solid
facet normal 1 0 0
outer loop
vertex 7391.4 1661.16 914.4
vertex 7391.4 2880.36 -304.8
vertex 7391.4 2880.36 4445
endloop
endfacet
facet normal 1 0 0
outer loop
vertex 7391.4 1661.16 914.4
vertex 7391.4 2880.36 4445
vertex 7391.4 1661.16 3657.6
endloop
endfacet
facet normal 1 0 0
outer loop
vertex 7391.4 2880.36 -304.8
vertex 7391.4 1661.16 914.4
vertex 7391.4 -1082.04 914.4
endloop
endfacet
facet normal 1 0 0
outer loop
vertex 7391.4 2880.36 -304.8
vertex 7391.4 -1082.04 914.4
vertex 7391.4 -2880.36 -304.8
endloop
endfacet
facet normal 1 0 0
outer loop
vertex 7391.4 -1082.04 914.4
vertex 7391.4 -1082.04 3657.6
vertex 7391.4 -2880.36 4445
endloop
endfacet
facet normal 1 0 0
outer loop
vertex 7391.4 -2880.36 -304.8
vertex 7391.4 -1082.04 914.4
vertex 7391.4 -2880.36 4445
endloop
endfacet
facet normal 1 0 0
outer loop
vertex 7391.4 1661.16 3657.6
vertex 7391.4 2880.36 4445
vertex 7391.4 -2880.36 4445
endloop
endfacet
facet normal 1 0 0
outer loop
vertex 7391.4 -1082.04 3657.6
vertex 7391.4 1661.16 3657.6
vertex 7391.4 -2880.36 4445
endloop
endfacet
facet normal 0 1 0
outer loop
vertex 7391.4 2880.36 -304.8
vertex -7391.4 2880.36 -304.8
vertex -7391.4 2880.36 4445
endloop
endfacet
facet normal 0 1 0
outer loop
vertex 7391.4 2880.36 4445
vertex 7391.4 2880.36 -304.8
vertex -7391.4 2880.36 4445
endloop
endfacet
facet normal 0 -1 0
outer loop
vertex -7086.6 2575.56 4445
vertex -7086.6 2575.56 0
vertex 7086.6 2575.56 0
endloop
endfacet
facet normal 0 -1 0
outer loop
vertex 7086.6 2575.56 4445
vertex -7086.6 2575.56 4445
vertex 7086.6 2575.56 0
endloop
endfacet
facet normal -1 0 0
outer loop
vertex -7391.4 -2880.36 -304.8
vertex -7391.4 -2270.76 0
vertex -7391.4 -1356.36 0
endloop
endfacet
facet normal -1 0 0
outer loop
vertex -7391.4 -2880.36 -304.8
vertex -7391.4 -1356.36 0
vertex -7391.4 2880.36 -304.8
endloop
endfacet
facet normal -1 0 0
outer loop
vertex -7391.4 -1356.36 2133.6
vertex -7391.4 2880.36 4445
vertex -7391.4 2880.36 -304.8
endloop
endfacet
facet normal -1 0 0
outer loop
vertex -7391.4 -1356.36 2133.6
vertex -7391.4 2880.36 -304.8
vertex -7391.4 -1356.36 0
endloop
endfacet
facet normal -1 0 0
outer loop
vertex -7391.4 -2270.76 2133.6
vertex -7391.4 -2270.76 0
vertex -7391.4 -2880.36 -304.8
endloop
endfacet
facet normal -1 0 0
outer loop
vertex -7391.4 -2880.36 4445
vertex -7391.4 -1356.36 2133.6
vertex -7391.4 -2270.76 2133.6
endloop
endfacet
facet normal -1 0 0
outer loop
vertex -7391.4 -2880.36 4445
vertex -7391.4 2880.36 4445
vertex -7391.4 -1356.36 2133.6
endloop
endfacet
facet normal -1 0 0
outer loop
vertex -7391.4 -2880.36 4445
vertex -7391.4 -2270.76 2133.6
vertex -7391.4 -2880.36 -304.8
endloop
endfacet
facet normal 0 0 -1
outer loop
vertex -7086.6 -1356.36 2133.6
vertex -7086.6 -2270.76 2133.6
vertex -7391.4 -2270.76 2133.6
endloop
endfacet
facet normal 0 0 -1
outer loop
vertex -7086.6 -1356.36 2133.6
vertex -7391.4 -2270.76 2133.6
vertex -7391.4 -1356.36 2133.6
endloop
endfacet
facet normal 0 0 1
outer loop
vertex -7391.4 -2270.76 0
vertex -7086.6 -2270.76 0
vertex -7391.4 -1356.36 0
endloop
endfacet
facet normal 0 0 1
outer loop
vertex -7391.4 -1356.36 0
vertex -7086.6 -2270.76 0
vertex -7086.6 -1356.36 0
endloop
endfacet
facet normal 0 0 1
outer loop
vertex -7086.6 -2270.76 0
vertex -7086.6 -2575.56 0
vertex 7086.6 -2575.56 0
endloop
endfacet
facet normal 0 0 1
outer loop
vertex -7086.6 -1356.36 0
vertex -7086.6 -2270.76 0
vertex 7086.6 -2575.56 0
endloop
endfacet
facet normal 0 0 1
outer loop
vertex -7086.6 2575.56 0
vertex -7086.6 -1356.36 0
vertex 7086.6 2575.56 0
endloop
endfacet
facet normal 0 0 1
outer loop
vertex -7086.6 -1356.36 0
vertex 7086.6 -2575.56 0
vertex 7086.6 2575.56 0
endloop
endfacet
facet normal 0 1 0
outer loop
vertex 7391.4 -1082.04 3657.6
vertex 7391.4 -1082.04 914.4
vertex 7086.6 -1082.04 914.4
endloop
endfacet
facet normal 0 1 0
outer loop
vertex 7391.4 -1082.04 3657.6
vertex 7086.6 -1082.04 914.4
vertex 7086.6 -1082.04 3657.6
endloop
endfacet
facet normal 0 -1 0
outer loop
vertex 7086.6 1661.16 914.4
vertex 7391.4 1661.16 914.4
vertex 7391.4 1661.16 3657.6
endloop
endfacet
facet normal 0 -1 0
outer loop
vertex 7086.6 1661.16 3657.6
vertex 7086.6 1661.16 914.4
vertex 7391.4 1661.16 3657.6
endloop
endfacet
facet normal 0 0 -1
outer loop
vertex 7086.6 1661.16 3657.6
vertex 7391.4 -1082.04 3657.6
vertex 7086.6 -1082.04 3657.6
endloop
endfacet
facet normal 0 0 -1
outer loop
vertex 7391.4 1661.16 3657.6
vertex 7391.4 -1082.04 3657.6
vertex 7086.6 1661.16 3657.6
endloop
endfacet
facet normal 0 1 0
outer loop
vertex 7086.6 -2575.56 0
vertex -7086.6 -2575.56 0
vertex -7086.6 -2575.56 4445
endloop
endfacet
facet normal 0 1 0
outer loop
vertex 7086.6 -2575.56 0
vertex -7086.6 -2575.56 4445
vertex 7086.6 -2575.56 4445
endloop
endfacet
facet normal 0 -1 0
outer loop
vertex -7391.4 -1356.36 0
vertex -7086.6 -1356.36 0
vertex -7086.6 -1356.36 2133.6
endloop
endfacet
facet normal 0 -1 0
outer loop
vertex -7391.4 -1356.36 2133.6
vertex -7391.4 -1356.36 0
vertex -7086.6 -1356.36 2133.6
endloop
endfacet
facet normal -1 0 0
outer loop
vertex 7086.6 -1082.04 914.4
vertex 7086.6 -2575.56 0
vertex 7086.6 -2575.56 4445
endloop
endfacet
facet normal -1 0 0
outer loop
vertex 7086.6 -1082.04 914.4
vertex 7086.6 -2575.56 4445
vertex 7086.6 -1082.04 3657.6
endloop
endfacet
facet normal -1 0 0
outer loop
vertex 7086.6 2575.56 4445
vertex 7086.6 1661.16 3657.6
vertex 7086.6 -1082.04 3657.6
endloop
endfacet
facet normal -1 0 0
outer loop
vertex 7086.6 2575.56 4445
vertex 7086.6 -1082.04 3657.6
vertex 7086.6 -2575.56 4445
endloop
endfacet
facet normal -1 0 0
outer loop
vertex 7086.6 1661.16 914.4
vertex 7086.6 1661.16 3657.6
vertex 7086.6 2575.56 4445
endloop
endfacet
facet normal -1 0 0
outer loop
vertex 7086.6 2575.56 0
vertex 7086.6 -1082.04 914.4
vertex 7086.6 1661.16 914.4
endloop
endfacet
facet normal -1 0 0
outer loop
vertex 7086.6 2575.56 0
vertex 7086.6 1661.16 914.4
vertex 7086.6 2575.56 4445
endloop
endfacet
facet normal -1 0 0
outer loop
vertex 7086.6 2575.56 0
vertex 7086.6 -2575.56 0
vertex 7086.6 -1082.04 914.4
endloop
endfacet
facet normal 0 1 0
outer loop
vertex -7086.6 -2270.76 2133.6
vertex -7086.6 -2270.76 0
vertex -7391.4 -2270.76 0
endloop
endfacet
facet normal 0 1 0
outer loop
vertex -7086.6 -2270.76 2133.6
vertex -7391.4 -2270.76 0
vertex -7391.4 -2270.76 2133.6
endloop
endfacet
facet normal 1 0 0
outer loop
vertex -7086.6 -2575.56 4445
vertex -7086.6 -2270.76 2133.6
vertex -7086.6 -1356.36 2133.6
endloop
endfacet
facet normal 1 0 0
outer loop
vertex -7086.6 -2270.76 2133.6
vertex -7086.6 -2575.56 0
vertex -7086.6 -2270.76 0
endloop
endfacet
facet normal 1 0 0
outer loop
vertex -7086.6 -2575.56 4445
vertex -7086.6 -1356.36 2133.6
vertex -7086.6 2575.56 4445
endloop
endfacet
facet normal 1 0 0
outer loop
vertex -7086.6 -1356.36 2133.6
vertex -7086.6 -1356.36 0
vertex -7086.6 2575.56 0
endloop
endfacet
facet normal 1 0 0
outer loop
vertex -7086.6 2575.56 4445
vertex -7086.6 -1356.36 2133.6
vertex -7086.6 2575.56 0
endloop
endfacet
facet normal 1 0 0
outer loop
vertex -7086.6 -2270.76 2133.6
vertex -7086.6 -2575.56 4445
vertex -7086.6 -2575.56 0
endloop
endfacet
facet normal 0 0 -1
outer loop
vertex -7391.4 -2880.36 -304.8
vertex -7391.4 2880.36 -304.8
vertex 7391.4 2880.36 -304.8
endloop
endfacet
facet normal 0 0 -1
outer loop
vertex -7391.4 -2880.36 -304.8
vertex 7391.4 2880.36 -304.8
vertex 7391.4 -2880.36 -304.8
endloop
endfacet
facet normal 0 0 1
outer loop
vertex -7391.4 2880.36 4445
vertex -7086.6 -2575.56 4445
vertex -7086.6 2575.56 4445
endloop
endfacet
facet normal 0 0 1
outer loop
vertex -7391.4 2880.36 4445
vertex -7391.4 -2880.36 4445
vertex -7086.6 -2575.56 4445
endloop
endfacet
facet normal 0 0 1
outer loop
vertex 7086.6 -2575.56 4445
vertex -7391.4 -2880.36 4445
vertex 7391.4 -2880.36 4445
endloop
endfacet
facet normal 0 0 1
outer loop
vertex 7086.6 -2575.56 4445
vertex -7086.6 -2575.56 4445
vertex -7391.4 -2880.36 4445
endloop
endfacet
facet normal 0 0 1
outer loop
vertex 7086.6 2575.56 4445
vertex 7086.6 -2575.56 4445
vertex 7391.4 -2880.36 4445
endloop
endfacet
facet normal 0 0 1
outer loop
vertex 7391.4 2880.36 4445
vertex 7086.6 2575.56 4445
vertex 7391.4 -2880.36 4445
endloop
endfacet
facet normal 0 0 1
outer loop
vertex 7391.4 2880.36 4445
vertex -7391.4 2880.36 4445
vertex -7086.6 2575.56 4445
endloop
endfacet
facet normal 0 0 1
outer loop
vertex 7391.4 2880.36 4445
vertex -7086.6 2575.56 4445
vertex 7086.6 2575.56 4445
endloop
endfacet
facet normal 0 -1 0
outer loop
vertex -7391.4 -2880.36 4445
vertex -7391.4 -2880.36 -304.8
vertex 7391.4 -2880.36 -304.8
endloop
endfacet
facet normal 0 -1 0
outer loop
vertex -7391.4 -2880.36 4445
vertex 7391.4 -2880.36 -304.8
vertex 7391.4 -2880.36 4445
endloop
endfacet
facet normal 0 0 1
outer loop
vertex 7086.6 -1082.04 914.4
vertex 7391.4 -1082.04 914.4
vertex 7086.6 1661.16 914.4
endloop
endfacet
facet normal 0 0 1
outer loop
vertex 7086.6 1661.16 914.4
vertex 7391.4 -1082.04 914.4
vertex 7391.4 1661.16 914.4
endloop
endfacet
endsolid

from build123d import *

# Parameters (mm, degrees)
F0_W     = 14782.8
F0_H     = 5760.72
F0_W_2   = 14173.2
F0_H_2   = 5151.12
F1_DEPTH = 4445
F2_W     = 5760.72
F2_H     = 304.8
F3_DEPTH = 14782.8
F4_W     = 2743.2
F4_H     = 2743.2
F5_DEPTH = 304.8
F6_W     = 914.4
F6_H     = 2133.6
F7_DEPTH = 304.8


with BuildPart() as f1:
    # F0 (on Top) → F1 (new body)
    with BuildSketch(Plane.XY):
        Rectangle(F0_W, F0_H)
        Rectangle(F0_W_2, F0_H_2, mode=Mode.SUBTRACT)
    extrude(amount=F1_DEPTH)

    # F2 (on face) → F3 (join, through all)
    with BuildSketch(Plane(origin=(-7391.4, 0, 0), x_dir=(0, -1, 0), z_dir=(-1, 0, 0))):
        with Locations((0, -152.4)):
            Rectangle(F2_W, F2_H)
    extrude(amount=-F3_DEPTH)

    # F4 (on face) → F5 (cut, through all)
    with BuildSketch(Plane.YZ.offset(7391.4)):
        with Locations((289.56, 2286)):
            Rectangle(F4_W, F4_H)
    extrude(amount=-F5_DEPTH, mode=Mode.SUBTRACT)

    # F6 (on face) → F7 (cut, through all)
    with BuildSketch(Plane.YZ.offset(-7086.6)):
        with Locations((-1813.56, 1066.8)):
            Rectangle(F6_W, F6_H)
    extrude(amount=-F7_DEPTH, mode=Mode.SUBTRACT)


solid = f1.part
